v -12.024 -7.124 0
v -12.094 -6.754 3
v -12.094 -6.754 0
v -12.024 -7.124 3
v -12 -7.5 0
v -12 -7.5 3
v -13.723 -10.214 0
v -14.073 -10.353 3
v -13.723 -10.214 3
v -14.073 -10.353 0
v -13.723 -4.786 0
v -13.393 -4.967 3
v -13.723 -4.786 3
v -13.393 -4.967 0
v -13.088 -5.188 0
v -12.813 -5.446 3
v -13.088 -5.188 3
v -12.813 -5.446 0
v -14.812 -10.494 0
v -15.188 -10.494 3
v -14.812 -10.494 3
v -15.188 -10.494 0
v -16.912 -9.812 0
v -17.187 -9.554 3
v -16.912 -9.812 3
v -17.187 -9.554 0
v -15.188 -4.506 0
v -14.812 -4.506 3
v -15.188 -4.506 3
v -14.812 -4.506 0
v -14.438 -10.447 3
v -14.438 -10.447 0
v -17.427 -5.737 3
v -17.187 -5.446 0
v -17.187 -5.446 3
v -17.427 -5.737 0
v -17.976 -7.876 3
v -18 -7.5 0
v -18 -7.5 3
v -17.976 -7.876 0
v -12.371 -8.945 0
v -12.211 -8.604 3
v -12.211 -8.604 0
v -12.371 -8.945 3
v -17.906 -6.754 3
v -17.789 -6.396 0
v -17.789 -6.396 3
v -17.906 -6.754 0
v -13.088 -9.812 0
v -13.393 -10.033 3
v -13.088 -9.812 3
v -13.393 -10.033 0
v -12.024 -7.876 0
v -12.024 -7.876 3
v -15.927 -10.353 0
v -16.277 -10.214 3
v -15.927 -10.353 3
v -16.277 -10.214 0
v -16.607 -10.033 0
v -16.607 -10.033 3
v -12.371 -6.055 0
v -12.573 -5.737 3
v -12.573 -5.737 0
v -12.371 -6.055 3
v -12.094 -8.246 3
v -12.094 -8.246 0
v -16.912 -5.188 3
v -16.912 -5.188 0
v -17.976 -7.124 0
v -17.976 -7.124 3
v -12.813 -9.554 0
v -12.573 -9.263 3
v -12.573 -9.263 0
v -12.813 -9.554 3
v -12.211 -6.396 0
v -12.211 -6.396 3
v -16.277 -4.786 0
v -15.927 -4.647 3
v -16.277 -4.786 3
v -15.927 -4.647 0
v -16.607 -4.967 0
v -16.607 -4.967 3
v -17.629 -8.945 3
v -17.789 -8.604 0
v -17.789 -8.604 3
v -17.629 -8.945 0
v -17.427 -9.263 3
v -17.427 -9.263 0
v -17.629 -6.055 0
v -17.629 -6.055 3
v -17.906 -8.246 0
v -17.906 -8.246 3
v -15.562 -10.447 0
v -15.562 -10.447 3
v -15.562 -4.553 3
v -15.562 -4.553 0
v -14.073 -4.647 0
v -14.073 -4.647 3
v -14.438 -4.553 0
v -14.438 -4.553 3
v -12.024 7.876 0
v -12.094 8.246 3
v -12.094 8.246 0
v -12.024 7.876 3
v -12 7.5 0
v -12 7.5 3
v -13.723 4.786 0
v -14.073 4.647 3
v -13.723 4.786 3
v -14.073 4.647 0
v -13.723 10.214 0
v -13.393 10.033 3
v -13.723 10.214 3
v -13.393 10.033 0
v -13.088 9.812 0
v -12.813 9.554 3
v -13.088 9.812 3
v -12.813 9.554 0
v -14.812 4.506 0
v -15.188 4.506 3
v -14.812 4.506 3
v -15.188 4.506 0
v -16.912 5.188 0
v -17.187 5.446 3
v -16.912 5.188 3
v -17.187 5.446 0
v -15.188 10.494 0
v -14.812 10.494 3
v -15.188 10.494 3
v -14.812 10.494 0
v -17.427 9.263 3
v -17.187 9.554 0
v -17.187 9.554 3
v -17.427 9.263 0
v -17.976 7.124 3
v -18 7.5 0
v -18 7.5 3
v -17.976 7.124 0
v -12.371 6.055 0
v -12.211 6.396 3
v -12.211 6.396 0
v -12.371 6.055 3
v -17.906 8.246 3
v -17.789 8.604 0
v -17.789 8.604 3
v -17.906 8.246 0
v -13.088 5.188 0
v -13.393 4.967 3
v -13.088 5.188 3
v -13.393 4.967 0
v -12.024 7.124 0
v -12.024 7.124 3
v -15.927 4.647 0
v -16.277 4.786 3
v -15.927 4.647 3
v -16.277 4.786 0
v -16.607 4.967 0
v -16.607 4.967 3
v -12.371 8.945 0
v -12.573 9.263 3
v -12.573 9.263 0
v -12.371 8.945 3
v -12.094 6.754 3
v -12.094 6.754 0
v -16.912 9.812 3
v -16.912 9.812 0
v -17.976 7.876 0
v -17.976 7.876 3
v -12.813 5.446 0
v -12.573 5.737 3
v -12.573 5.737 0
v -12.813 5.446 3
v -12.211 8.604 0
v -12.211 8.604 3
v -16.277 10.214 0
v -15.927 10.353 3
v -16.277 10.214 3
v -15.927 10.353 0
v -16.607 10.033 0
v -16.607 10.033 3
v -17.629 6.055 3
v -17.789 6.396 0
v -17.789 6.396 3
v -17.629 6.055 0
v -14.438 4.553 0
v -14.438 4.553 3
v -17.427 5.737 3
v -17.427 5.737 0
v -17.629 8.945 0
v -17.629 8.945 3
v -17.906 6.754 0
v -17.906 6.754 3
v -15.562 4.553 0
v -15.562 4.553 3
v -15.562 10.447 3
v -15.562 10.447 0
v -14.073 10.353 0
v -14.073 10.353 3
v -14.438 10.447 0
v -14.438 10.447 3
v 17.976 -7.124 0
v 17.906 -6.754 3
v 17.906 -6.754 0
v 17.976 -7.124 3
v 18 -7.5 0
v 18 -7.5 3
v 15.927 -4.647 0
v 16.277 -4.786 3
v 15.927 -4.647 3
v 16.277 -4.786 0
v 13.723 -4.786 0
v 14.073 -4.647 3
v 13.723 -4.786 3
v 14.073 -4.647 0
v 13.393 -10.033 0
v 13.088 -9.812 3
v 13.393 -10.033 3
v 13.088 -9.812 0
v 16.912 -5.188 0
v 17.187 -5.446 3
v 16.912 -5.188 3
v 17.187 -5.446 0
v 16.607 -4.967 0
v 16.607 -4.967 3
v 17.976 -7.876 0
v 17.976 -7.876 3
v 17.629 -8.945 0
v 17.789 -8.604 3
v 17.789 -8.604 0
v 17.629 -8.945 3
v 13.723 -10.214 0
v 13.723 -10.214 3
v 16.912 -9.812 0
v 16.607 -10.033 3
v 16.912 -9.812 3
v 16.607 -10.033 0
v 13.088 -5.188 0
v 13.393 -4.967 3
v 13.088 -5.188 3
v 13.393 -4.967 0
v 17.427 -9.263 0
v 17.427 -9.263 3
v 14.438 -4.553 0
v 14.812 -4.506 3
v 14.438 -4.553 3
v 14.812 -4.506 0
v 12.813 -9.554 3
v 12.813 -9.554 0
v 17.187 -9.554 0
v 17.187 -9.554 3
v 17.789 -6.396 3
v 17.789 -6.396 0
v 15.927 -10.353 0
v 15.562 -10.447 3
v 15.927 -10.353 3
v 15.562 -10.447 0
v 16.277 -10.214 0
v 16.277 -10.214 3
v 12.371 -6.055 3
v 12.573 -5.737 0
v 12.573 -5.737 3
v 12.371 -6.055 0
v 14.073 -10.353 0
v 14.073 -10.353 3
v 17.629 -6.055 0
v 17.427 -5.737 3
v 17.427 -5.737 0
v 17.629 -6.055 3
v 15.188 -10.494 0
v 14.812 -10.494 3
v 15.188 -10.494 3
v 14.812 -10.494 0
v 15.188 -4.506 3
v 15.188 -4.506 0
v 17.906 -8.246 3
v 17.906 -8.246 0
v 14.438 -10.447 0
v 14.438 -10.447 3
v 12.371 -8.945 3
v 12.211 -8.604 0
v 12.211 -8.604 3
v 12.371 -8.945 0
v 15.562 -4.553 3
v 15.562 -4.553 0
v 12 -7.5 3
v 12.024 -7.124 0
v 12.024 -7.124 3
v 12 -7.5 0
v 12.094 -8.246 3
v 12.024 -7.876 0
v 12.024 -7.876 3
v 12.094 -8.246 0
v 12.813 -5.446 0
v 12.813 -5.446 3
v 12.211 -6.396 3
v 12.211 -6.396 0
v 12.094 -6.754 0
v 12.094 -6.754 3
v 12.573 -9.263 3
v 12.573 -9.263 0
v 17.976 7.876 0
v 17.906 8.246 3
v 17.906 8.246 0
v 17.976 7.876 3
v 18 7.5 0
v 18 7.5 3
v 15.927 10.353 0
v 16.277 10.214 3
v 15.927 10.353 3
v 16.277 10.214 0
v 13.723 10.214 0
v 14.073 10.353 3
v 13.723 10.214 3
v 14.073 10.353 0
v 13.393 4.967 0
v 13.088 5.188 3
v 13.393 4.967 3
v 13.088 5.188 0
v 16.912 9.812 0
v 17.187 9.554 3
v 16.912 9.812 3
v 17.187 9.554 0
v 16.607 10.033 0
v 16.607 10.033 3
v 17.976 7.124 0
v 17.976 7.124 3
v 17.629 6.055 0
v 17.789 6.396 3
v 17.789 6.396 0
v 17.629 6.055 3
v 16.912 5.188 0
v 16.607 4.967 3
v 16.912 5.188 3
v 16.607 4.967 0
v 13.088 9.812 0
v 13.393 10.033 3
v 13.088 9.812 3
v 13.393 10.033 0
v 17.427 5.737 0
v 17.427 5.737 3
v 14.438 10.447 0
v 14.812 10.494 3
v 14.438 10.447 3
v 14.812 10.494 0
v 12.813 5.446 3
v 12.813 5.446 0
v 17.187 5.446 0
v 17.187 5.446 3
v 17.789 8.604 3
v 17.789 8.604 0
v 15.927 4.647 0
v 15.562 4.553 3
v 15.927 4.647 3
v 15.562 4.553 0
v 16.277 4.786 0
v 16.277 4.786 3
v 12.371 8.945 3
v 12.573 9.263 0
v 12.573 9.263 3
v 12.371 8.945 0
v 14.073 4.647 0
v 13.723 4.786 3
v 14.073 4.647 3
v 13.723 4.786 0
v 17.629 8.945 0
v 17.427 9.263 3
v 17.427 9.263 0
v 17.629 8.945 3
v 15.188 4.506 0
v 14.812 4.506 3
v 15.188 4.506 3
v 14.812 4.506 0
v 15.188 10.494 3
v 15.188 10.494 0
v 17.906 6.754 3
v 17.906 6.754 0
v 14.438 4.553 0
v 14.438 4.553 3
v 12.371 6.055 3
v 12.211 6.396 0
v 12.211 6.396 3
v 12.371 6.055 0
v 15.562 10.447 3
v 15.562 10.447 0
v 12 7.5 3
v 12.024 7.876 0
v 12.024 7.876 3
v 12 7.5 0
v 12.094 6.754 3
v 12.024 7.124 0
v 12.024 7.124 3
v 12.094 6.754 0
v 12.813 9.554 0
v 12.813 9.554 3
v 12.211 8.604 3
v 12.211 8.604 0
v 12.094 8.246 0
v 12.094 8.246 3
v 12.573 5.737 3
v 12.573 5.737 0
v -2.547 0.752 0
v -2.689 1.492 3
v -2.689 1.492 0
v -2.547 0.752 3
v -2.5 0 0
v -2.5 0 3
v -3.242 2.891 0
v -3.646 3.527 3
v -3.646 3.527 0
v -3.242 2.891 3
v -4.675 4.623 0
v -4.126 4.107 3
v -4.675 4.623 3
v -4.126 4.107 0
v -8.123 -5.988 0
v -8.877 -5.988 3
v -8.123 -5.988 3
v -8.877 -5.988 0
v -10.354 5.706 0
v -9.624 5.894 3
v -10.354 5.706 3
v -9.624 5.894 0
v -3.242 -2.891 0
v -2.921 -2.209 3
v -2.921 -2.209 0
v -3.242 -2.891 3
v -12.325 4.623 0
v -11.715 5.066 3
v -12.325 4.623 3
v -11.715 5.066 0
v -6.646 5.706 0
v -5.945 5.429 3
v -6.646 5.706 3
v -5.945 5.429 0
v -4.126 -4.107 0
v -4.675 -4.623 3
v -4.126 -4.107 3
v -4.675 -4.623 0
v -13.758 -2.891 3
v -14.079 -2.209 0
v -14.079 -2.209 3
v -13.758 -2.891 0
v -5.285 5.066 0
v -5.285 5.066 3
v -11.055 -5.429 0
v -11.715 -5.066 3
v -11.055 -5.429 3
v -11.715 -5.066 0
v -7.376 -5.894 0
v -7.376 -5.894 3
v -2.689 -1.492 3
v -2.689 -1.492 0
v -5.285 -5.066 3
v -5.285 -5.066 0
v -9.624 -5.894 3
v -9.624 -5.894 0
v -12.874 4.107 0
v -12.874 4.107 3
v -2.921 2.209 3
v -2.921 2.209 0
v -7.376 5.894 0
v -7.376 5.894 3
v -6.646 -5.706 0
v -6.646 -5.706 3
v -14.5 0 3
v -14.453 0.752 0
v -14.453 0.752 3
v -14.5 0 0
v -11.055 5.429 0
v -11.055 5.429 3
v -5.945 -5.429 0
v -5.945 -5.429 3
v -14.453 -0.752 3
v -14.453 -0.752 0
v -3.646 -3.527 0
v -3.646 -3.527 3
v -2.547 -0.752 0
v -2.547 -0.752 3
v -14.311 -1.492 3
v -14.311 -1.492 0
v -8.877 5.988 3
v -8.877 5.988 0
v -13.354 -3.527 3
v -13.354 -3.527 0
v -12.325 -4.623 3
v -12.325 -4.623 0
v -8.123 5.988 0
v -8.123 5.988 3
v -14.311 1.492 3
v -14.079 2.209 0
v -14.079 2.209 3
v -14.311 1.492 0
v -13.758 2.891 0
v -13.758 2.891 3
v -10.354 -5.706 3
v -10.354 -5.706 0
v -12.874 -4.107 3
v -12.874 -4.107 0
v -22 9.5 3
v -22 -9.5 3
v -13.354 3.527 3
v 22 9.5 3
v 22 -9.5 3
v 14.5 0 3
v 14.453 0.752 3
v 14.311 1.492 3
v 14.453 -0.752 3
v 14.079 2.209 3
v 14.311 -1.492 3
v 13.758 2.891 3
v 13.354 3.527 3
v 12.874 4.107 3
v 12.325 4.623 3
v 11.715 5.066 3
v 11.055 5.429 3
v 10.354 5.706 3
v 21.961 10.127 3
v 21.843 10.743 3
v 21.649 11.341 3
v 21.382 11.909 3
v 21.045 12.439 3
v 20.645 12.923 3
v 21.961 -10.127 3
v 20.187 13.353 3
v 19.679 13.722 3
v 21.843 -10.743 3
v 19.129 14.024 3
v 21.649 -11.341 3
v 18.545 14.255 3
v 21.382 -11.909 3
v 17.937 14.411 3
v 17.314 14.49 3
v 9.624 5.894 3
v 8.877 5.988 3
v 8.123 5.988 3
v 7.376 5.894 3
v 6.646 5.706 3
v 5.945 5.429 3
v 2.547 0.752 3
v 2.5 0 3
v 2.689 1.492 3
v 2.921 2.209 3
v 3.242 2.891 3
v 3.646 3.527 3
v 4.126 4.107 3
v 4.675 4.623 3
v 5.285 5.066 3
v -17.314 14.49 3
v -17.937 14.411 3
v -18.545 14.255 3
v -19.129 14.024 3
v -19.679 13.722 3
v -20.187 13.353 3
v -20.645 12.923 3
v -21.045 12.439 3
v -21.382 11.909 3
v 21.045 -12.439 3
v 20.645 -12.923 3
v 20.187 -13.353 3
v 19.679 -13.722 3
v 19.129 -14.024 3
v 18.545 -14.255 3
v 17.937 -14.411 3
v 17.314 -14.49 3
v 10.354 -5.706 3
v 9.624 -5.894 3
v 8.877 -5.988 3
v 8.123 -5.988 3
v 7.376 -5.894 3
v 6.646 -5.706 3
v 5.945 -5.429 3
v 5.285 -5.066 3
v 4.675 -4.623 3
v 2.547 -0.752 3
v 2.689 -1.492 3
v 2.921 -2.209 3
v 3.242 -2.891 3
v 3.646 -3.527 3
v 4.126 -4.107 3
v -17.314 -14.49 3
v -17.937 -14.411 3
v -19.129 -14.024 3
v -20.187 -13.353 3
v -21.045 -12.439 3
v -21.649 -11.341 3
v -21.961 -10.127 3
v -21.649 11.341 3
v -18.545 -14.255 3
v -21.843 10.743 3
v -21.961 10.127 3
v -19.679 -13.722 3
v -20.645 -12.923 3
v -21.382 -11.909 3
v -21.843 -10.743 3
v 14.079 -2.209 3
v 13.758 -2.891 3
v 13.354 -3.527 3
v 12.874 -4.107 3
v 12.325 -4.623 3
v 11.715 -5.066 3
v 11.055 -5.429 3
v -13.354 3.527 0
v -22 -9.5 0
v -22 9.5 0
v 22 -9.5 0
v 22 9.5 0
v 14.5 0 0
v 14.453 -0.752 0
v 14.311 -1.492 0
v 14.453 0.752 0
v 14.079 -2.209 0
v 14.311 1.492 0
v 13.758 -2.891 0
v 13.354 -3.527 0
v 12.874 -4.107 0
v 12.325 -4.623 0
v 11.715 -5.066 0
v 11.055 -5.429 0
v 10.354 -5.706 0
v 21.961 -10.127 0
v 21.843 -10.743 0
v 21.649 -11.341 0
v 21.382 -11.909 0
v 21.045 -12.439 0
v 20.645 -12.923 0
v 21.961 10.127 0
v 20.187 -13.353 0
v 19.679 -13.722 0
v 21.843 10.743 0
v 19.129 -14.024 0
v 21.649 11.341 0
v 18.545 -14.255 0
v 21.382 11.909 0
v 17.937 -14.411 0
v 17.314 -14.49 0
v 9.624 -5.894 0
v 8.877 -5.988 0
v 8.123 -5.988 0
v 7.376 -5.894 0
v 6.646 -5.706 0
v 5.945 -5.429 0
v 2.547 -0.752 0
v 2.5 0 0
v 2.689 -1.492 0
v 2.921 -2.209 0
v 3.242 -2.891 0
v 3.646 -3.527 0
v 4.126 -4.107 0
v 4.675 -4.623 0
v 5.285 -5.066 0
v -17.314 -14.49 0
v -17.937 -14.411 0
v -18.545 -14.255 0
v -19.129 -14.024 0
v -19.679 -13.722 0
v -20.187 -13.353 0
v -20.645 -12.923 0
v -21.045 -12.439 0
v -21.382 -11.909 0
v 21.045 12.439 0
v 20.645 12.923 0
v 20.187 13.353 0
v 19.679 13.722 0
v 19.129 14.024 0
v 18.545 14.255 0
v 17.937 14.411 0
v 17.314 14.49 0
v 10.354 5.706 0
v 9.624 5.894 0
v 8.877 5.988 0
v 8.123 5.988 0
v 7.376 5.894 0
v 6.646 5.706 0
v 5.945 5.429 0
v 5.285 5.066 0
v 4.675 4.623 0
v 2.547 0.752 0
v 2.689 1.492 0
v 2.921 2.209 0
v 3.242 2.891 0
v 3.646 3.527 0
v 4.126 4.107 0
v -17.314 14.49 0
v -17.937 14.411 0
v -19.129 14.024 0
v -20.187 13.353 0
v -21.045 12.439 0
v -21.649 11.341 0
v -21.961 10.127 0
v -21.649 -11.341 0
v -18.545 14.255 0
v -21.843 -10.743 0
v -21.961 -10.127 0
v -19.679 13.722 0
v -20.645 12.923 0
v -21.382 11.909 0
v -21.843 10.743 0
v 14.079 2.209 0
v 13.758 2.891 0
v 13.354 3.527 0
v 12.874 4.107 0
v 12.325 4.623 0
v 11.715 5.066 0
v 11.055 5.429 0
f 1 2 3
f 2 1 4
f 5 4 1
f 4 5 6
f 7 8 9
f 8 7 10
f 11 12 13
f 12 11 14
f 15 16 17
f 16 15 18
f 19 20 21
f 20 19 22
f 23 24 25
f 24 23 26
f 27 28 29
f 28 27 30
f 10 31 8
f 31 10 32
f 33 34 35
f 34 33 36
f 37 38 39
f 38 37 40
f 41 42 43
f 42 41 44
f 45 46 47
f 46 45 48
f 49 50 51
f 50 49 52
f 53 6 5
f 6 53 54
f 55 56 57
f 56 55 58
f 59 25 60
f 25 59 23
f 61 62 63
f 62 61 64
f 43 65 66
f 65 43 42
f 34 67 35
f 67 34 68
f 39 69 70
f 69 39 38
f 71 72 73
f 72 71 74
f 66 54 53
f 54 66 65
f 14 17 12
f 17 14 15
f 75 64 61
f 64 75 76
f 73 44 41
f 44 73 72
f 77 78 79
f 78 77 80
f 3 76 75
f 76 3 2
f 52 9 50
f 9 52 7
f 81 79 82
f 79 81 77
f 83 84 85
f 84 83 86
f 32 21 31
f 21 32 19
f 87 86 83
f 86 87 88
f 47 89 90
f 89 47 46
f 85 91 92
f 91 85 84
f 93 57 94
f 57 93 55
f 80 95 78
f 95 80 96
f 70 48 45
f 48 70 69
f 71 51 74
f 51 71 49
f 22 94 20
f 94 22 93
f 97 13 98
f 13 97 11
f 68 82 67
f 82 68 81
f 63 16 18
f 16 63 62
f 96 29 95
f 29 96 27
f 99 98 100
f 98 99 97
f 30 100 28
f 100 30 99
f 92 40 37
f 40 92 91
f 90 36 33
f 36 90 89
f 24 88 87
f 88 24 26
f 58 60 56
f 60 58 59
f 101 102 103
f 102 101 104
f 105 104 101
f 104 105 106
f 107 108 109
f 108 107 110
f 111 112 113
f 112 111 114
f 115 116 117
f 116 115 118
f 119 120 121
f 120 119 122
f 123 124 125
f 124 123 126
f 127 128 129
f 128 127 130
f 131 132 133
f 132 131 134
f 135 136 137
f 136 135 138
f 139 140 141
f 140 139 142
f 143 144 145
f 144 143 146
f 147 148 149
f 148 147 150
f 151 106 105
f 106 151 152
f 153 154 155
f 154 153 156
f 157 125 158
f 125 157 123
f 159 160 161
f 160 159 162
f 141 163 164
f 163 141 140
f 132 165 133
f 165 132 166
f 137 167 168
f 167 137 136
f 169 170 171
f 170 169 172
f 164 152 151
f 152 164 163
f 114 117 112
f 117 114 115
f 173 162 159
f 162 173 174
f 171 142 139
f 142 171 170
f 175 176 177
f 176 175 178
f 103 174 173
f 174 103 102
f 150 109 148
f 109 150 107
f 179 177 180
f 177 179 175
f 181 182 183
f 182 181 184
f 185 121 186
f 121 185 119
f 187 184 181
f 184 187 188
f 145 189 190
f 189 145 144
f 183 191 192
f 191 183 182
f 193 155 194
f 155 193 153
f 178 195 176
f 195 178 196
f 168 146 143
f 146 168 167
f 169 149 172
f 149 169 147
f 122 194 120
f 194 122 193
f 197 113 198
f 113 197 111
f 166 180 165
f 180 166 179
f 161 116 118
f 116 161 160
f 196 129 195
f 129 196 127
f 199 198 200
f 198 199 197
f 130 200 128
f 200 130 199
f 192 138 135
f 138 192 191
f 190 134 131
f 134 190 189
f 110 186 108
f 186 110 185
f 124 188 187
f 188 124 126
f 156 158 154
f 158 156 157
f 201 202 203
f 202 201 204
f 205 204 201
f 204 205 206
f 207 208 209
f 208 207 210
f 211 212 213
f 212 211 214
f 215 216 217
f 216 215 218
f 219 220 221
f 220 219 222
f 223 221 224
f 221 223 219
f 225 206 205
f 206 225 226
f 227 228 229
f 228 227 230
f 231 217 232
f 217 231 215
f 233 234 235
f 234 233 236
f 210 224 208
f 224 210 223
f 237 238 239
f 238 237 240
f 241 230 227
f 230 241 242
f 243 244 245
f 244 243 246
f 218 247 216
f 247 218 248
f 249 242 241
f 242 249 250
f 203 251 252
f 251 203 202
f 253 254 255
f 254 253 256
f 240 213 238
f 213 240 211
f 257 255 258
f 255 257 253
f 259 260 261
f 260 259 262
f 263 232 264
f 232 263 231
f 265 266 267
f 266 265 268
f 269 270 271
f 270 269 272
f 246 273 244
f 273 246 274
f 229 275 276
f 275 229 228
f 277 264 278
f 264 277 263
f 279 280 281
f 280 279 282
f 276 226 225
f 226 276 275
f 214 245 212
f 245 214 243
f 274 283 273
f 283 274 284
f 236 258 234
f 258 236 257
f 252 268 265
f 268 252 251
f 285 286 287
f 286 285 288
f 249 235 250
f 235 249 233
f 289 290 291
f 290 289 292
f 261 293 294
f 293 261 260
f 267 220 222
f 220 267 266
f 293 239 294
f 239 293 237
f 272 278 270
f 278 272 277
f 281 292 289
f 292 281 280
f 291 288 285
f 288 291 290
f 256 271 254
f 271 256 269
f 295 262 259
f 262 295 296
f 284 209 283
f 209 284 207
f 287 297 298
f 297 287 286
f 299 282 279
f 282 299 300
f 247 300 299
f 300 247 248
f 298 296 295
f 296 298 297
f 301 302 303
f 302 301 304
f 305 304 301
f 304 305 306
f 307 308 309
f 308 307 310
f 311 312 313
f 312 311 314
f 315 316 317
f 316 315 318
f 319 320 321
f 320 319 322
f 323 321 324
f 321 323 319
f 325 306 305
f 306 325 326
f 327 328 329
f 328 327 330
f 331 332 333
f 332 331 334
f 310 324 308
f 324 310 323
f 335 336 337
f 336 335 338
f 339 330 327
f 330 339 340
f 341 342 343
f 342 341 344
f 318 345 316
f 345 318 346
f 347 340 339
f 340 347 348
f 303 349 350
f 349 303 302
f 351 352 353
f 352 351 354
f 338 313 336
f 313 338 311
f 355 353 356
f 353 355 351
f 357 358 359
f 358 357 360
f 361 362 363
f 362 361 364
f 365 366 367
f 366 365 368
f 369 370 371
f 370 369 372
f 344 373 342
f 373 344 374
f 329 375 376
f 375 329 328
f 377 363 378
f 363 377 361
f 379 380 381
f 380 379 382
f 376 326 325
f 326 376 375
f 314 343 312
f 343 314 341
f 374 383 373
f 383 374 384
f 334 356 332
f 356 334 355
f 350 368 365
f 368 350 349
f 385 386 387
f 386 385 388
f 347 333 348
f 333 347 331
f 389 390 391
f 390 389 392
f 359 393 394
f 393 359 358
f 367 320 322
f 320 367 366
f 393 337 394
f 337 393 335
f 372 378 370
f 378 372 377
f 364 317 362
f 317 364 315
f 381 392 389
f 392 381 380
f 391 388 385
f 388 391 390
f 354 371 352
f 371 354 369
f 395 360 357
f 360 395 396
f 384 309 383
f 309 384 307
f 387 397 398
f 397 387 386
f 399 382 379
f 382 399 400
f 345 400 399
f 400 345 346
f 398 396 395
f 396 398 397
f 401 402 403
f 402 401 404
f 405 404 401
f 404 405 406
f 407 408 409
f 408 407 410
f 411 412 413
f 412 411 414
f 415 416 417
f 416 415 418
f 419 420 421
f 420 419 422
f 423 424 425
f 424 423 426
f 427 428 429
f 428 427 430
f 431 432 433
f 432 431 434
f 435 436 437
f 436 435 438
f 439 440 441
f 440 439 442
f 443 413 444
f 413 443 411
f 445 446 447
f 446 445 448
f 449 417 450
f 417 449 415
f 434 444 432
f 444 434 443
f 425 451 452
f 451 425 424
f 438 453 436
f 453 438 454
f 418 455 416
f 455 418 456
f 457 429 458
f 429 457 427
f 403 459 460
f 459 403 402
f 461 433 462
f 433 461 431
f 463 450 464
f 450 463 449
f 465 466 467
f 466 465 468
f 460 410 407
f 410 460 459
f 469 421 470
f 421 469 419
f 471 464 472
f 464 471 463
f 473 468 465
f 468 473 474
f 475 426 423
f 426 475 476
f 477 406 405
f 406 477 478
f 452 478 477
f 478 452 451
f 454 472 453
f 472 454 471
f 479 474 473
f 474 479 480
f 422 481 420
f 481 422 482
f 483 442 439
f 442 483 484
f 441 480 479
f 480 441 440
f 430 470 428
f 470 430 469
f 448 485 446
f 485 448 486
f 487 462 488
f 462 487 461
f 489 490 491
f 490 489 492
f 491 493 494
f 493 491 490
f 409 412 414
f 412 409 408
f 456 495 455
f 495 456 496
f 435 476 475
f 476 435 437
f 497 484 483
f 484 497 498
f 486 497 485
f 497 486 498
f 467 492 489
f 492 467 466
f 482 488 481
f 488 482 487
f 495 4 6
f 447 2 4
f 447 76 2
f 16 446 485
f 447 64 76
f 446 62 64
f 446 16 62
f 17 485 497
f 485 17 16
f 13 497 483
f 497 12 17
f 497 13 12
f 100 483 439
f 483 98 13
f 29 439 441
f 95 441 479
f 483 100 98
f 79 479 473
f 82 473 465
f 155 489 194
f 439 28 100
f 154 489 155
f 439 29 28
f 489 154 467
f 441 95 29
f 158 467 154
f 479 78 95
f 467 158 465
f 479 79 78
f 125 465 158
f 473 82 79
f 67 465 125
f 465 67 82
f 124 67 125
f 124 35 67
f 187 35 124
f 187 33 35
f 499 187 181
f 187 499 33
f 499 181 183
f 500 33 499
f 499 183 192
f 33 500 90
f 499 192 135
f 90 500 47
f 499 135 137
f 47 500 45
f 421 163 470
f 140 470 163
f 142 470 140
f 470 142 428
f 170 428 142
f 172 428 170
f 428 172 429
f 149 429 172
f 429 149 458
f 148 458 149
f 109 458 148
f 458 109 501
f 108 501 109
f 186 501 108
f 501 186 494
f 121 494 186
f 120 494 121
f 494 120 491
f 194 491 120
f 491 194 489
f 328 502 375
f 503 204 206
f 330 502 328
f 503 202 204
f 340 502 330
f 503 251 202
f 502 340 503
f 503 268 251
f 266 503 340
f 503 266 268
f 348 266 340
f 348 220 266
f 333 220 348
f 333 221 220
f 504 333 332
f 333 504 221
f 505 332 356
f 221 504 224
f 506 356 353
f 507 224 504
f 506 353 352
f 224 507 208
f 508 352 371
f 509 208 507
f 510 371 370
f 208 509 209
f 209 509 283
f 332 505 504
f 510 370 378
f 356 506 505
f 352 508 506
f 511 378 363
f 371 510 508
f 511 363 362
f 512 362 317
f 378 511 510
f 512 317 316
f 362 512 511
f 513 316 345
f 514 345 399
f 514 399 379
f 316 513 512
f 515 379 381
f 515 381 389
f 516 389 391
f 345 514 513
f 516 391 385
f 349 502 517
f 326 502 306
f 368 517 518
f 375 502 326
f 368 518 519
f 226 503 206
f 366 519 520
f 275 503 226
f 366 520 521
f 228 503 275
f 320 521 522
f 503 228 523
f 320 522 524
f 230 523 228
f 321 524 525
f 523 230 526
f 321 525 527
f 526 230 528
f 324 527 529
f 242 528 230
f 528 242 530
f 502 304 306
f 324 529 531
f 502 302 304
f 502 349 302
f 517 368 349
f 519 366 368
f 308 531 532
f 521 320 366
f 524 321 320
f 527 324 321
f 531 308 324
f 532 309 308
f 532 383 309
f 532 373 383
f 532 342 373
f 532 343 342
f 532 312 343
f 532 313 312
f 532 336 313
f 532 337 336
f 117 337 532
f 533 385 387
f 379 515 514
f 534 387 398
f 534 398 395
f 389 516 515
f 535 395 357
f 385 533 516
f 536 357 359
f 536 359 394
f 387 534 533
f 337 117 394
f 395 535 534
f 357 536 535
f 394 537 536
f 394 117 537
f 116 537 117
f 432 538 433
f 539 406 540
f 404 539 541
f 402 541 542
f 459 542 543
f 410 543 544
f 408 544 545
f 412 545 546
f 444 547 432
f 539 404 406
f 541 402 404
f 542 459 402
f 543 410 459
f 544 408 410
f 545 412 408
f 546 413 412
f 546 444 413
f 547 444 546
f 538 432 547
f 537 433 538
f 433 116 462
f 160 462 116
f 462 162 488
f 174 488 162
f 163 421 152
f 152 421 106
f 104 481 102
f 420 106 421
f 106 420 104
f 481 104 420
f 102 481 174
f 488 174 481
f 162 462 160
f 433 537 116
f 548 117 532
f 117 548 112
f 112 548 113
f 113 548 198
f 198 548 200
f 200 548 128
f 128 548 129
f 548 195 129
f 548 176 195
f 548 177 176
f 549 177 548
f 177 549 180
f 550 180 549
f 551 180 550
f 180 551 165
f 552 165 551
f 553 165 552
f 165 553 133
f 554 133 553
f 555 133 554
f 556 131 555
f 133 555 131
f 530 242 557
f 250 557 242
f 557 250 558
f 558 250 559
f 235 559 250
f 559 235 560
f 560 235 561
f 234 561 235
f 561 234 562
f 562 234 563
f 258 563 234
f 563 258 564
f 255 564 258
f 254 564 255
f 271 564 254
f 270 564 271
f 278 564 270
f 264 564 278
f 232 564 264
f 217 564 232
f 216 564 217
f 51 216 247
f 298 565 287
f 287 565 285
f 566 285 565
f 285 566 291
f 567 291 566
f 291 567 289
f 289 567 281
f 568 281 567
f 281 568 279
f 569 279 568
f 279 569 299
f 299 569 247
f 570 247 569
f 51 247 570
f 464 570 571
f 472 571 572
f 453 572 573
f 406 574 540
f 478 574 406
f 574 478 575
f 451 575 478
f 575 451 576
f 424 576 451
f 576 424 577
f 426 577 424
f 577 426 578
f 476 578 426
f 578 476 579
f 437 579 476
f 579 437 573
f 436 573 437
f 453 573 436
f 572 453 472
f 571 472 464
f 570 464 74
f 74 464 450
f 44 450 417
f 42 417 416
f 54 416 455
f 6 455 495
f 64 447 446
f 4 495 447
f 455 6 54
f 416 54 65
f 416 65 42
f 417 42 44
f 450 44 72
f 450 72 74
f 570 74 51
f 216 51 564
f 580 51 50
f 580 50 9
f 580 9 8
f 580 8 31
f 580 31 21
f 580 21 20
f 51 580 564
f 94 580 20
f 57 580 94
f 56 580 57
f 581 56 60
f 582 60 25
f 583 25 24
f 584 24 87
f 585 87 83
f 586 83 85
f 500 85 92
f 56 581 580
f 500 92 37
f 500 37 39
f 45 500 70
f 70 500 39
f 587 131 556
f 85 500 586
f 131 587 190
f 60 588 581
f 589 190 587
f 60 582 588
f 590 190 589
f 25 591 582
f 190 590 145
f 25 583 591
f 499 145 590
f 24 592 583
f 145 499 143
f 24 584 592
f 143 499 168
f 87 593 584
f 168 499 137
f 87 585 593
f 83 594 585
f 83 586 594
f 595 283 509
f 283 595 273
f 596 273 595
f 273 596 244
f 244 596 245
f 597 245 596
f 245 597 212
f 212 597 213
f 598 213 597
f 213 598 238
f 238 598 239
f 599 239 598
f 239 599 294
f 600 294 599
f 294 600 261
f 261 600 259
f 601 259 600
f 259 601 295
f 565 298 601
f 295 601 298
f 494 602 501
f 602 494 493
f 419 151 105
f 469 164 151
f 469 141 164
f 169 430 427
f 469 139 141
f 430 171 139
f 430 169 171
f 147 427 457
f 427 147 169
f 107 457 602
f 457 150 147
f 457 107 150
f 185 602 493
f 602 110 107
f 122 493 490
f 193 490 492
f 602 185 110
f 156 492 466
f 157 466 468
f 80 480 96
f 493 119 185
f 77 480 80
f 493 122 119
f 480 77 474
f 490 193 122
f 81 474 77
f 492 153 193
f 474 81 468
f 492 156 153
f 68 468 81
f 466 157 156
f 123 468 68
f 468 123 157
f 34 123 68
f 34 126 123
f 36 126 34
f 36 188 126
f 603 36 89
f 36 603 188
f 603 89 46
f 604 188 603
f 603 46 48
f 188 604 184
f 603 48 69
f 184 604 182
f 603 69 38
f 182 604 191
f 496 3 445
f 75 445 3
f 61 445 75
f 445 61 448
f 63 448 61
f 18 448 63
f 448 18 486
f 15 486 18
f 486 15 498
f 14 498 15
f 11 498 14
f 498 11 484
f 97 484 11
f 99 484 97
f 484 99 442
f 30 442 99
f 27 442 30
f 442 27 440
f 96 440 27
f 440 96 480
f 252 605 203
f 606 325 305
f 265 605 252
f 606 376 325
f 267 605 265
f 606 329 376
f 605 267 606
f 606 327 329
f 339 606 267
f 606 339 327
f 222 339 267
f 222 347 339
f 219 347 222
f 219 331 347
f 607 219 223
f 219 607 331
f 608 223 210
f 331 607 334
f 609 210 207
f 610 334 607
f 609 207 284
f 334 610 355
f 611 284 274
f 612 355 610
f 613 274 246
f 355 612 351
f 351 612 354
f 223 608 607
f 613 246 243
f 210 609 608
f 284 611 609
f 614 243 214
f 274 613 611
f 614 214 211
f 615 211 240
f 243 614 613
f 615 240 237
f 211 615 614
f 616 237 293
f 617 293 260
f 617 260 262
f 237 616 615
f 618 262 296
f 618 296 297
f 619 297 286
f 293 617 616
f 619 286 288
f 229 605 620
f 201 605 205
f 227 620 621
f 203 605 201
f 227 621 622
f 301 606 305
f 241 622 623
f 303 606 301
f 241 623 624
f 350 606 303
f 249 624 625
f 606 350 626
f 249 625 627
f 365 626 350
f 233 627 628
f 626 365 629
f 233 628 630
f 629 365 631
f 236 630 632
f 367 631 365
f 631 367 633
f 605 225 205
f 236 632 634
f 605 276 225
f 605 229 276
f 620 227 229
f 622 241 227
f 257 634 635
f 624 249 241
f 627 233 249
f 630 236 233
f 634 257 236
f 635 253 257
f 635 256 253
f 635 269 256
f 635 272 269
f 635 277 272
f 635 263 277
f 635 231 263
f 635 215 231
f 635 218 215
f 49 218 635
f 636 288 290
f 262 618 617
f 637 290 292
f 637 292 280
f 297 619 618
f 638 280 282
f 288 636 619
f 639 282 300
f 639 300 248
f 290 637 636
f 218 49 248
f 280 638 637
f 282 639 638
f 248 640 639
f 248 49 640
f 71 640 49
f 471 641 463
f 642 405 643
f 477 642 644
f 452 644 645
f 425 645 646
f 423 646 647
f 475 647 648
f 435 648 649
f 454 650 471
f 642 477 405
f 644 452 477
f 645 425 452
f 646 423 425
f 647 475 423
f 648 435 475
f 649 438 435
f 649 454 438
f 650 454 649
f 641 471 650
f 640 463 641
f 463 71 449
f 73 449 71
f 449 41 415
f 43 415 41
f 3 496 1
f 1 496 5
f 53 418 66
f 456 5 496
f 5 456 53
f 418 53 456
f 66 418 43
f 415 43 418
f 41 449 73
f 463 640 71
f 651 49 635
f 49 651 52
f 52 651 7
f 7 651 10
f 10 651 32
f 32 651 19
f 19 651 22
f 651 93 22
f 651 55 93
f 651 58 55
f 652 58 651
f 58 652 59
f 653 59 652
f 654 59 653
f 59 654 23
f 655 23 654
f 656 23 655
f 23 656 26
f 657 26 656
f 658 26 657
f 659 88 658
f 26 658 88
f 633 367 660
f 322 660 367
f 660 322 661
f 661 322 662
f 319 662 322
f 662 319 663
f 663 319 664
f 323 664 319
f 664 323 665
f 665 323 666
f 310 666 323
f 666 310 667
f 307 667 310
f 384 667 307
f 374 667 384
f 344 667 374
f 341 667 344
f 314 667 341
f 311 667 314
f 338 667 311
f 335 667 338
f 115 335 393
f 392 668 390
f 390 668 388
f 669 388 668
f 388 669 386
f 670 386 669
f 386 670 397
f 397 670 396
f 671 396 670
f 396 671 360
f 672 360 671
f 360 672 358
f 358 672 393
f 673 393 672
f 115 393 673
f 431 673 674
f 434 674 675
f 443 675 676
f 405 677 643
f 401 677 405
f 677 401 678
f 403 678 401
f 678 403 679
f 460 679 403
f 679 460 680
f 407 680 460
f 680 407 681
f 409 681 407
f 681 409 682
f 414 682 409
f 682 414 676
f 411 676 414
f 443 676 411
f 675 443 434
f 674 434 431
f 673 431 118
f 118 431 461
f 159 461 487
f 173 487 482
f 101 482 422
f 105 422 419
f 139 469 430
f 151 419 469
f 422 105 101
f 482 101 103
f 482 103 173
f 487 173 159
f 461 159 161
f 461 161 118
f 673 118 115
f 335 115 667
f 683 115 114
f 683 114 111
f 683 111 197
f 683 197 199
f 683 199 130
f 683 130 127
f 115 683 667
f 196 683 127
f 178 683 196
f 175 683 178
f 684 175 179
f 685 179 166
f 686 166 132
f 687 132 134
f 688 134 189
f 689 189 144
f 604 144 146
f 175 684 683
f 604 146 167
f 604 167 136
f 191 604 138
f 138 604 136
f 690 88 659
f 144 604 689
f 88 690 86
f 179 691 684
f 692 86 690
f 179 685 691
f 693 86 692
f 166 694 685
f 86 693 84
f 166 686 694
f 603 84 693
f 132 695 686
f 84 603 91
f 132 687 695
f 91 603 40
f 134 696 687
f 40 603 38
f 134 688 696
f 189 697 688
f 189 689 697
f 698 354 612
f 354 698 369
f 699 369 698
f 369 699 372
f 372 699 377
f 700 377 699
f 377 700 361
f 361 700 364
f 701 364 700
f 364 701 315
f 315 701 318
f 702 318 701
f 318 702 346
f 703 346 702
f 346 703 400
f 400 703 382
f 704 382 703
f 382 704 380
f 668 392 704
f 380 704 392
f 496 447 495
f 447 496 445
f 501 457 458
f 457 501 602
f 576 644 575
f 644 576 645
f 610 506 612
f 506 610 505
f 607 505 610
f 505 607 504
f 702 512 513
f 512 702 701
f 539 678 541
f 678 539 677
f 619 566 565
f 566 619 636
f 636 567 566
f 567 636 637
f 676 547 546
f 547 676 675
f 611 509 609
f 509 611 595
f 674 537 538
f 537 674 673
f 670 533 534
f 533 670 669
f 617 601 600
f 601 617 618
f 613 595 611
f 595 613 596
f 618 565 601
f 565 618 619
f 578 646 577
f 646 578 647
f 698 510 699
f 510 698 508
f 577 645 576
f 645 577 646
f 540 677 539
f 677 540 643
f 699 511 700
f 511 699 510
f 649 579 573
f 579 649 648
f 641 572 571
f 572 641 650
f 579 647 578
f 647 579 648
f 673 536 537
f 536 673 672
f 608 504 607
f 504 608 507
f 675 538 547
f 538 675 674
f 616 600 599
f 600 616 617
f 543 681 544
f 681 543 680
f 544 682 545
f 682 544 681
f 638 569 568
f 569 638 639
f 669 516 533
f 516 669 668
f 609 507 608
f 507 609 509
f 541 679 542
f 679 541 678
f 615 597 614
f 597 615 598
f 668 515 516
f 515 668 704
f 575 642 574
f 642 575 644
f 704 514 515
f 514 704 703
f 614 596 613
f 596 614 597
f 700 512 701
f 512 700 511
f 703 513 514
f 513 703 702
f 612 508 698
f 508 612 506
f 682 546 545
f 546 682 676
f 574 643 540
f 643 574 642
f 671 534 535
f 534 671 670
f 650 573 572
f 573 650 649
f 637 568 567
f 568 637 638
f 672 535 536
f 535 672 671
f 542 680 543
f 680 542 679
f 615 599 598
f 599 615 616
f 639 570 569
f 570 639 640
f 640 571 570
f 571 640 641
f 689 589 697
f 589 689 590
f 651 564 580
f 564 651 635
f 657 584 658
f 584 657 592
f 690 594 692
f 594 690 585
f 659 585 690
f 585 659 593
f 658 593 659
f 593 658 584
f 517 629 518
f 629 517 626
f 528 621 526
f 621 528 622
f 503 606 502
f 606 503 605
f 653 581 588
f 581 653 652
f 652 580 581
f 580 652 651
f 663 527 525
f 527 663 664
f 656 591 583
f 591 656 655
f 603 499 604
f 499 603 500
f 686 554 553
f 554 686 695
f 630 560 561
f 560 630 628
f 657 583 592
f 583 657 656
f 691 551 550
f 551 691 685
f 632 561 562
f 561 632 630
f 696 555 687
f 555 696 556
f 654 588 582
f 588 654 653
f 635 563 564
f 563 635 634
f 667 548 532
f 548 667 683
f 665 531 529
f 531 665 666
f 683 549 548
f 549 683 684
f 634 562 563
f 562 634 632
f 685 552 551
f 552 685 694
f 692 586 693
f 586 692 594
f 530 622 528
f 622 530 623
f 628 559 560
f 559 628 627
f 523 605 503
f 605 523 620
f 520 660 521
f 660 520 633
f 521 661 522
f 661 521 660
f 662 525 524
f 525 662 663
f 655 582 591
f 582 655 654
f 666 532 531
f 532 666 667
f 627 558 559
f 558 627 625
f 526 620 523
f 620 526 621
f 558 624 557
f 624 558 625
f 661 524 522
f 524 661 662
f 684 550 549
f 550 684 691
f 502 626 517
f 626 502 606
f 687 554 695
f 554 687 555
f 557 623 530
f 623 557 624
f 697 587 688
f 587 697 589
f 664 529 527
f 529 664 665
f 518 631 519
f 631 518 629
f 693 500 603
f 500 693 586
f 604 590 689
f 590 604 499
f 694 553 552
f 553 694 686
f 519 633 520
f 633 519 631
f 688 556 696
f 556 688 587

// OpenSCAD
$fn = 50;


difference() {
	union() {
		hull() {
			translate(v = [-17.0000000000, 9.5000000000, 0]) {
				cylinder(h = 3, r = 5);
			}
			translate(v = [17.0000000000, 9.5000000000, 0]) {
				cylinder(h = 3, r = 5);
			}
			translate(v = [-17.0000000000, -9.5000000000, 0]) {
				cylinder(h = 3, r = 5);
			}
			translate(v = [17.0000000000, -9.5000000000, 0]) {
				cylinder(h = 3, r = 5);
			}
		}
	}
	union() {
		#translate(v = [-15.0000000000, -7.5000000000, -100.0000000000]) {
			cylinder(h = 200, r = 3.0000000000);
		}
		#translate(v = [-15.0000000000, 7.5000000000, -100.0000000000]) {
			cylinder(h = 200, r = 3.0000000000);
		}
		#translate(v = [15.0000000000, -7.5000000000, -100.0000000000]) {
			cylinder(h = 200, r = 3.0000000000);
		}
		#translate(v = [15.0000000000, 7.5000000000, -100.0000000000]) {
			cylinder(h = 200, r = 3.0000000000);
		}
		#translate(v = [-8.5000000000, 0, 0]) {
			cylinder(h = 3, r = 6.0000000000);
		}
		#translate(v = [8.5000000000, 0, 0]) {
			cylinder(h = 3, r = 6.0000000000);
		}
	}
}
